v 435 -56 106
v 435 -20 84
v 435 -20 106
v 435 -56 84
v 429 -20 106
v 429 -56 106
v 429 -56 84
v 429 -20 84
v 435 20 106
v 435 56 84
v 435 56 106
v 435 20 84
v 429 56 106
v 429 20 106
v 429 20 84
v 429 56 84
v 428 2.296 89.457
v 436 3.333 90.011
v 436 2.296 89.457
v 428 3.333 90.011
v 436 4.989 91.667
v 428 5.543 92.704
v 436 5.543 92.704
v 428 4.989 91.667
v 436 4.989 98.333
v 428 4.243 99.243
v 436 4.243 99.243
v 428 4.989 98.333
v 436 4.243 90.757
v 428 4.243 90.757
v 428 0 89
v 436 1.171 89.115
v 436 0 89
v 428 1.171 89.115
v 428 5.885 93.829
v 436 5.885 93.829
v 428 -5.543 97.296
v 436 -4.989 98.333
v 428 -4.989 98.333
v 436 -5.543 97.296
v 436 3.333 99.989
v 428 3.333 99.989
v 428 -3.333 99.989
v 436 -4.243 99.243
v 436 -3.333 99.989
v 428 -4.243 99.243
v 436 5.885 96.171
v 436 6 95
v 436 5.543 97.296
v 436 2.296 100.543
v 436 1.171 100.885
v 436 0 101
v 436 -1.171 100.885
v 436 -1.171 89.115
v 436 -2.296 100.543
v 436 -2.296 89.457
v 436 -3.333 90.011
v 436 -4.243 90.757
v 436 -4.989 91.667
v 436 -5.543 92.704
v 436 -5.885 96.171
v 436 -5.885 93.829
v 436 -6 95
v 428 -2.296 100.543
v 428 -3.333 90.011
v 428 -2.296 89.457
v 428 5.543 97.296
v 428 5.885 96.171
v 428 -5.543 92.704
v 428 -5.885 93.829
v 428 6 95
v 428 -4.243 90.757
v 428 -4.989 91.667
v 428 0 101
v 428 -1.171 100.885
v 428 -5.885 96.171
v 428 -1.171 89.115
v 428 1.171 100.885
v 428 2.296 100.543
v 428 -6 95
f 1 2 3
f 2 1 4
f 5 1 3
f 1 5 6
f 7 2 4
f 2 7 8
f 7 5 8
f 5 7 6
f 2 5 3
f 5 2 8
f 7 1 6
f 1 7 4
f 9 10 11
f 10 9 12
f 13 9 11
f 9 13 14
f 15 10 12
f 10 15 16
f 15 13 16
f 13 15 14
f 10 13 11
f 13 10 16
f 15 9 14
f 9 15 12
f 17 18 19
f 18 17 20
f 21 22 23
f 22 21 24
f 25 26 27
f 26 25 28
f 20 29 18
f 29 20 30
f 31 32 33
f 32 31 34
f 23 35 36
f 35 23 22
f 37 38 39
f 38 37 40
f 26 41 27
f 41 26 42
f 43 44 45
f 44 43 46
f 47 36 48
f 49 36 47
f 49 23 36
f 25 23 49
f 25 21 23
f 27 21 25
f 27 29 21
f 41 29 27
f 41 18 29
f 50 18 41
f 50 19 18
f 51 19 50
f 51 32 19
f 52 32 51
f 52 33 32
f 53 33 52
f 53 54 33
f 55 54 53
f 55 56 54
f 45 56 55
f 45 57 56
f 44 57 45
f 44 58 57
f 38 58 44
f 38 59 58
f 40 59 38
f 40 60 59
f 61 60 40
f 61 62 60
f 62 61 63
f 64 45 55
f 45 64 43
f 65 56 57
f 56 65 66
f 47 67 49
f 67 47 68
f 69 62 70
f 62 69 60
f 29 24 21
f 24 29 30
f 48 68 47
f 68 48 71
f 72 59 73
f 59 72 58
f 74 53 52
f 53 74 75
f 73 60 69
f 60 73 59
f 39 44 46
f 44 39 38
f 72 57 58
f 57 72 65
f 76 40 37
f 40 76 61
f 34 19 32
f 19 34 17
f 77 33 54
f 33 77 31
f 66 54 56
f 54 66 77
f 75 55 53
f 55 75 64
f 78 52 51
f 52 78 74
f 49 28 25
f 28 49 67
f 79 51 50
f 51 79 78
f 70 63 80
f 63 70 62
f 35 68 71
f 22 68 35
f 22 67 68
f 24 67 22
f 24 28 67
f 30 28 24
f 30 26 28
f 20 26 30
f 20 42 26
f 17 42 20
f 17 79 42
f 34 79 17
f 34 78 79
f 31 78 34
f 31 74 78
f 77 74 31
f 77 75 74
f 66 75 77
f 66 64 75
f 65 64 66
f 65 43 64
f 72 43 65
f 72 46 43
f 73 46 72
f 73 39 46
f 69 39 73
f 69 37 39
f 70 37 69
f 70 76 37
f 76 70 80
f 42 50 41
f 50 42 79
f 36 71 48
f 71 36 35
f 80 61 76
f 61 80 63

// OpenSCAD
export_only = true;
include <main.scad>
charging_contacts_plates();
